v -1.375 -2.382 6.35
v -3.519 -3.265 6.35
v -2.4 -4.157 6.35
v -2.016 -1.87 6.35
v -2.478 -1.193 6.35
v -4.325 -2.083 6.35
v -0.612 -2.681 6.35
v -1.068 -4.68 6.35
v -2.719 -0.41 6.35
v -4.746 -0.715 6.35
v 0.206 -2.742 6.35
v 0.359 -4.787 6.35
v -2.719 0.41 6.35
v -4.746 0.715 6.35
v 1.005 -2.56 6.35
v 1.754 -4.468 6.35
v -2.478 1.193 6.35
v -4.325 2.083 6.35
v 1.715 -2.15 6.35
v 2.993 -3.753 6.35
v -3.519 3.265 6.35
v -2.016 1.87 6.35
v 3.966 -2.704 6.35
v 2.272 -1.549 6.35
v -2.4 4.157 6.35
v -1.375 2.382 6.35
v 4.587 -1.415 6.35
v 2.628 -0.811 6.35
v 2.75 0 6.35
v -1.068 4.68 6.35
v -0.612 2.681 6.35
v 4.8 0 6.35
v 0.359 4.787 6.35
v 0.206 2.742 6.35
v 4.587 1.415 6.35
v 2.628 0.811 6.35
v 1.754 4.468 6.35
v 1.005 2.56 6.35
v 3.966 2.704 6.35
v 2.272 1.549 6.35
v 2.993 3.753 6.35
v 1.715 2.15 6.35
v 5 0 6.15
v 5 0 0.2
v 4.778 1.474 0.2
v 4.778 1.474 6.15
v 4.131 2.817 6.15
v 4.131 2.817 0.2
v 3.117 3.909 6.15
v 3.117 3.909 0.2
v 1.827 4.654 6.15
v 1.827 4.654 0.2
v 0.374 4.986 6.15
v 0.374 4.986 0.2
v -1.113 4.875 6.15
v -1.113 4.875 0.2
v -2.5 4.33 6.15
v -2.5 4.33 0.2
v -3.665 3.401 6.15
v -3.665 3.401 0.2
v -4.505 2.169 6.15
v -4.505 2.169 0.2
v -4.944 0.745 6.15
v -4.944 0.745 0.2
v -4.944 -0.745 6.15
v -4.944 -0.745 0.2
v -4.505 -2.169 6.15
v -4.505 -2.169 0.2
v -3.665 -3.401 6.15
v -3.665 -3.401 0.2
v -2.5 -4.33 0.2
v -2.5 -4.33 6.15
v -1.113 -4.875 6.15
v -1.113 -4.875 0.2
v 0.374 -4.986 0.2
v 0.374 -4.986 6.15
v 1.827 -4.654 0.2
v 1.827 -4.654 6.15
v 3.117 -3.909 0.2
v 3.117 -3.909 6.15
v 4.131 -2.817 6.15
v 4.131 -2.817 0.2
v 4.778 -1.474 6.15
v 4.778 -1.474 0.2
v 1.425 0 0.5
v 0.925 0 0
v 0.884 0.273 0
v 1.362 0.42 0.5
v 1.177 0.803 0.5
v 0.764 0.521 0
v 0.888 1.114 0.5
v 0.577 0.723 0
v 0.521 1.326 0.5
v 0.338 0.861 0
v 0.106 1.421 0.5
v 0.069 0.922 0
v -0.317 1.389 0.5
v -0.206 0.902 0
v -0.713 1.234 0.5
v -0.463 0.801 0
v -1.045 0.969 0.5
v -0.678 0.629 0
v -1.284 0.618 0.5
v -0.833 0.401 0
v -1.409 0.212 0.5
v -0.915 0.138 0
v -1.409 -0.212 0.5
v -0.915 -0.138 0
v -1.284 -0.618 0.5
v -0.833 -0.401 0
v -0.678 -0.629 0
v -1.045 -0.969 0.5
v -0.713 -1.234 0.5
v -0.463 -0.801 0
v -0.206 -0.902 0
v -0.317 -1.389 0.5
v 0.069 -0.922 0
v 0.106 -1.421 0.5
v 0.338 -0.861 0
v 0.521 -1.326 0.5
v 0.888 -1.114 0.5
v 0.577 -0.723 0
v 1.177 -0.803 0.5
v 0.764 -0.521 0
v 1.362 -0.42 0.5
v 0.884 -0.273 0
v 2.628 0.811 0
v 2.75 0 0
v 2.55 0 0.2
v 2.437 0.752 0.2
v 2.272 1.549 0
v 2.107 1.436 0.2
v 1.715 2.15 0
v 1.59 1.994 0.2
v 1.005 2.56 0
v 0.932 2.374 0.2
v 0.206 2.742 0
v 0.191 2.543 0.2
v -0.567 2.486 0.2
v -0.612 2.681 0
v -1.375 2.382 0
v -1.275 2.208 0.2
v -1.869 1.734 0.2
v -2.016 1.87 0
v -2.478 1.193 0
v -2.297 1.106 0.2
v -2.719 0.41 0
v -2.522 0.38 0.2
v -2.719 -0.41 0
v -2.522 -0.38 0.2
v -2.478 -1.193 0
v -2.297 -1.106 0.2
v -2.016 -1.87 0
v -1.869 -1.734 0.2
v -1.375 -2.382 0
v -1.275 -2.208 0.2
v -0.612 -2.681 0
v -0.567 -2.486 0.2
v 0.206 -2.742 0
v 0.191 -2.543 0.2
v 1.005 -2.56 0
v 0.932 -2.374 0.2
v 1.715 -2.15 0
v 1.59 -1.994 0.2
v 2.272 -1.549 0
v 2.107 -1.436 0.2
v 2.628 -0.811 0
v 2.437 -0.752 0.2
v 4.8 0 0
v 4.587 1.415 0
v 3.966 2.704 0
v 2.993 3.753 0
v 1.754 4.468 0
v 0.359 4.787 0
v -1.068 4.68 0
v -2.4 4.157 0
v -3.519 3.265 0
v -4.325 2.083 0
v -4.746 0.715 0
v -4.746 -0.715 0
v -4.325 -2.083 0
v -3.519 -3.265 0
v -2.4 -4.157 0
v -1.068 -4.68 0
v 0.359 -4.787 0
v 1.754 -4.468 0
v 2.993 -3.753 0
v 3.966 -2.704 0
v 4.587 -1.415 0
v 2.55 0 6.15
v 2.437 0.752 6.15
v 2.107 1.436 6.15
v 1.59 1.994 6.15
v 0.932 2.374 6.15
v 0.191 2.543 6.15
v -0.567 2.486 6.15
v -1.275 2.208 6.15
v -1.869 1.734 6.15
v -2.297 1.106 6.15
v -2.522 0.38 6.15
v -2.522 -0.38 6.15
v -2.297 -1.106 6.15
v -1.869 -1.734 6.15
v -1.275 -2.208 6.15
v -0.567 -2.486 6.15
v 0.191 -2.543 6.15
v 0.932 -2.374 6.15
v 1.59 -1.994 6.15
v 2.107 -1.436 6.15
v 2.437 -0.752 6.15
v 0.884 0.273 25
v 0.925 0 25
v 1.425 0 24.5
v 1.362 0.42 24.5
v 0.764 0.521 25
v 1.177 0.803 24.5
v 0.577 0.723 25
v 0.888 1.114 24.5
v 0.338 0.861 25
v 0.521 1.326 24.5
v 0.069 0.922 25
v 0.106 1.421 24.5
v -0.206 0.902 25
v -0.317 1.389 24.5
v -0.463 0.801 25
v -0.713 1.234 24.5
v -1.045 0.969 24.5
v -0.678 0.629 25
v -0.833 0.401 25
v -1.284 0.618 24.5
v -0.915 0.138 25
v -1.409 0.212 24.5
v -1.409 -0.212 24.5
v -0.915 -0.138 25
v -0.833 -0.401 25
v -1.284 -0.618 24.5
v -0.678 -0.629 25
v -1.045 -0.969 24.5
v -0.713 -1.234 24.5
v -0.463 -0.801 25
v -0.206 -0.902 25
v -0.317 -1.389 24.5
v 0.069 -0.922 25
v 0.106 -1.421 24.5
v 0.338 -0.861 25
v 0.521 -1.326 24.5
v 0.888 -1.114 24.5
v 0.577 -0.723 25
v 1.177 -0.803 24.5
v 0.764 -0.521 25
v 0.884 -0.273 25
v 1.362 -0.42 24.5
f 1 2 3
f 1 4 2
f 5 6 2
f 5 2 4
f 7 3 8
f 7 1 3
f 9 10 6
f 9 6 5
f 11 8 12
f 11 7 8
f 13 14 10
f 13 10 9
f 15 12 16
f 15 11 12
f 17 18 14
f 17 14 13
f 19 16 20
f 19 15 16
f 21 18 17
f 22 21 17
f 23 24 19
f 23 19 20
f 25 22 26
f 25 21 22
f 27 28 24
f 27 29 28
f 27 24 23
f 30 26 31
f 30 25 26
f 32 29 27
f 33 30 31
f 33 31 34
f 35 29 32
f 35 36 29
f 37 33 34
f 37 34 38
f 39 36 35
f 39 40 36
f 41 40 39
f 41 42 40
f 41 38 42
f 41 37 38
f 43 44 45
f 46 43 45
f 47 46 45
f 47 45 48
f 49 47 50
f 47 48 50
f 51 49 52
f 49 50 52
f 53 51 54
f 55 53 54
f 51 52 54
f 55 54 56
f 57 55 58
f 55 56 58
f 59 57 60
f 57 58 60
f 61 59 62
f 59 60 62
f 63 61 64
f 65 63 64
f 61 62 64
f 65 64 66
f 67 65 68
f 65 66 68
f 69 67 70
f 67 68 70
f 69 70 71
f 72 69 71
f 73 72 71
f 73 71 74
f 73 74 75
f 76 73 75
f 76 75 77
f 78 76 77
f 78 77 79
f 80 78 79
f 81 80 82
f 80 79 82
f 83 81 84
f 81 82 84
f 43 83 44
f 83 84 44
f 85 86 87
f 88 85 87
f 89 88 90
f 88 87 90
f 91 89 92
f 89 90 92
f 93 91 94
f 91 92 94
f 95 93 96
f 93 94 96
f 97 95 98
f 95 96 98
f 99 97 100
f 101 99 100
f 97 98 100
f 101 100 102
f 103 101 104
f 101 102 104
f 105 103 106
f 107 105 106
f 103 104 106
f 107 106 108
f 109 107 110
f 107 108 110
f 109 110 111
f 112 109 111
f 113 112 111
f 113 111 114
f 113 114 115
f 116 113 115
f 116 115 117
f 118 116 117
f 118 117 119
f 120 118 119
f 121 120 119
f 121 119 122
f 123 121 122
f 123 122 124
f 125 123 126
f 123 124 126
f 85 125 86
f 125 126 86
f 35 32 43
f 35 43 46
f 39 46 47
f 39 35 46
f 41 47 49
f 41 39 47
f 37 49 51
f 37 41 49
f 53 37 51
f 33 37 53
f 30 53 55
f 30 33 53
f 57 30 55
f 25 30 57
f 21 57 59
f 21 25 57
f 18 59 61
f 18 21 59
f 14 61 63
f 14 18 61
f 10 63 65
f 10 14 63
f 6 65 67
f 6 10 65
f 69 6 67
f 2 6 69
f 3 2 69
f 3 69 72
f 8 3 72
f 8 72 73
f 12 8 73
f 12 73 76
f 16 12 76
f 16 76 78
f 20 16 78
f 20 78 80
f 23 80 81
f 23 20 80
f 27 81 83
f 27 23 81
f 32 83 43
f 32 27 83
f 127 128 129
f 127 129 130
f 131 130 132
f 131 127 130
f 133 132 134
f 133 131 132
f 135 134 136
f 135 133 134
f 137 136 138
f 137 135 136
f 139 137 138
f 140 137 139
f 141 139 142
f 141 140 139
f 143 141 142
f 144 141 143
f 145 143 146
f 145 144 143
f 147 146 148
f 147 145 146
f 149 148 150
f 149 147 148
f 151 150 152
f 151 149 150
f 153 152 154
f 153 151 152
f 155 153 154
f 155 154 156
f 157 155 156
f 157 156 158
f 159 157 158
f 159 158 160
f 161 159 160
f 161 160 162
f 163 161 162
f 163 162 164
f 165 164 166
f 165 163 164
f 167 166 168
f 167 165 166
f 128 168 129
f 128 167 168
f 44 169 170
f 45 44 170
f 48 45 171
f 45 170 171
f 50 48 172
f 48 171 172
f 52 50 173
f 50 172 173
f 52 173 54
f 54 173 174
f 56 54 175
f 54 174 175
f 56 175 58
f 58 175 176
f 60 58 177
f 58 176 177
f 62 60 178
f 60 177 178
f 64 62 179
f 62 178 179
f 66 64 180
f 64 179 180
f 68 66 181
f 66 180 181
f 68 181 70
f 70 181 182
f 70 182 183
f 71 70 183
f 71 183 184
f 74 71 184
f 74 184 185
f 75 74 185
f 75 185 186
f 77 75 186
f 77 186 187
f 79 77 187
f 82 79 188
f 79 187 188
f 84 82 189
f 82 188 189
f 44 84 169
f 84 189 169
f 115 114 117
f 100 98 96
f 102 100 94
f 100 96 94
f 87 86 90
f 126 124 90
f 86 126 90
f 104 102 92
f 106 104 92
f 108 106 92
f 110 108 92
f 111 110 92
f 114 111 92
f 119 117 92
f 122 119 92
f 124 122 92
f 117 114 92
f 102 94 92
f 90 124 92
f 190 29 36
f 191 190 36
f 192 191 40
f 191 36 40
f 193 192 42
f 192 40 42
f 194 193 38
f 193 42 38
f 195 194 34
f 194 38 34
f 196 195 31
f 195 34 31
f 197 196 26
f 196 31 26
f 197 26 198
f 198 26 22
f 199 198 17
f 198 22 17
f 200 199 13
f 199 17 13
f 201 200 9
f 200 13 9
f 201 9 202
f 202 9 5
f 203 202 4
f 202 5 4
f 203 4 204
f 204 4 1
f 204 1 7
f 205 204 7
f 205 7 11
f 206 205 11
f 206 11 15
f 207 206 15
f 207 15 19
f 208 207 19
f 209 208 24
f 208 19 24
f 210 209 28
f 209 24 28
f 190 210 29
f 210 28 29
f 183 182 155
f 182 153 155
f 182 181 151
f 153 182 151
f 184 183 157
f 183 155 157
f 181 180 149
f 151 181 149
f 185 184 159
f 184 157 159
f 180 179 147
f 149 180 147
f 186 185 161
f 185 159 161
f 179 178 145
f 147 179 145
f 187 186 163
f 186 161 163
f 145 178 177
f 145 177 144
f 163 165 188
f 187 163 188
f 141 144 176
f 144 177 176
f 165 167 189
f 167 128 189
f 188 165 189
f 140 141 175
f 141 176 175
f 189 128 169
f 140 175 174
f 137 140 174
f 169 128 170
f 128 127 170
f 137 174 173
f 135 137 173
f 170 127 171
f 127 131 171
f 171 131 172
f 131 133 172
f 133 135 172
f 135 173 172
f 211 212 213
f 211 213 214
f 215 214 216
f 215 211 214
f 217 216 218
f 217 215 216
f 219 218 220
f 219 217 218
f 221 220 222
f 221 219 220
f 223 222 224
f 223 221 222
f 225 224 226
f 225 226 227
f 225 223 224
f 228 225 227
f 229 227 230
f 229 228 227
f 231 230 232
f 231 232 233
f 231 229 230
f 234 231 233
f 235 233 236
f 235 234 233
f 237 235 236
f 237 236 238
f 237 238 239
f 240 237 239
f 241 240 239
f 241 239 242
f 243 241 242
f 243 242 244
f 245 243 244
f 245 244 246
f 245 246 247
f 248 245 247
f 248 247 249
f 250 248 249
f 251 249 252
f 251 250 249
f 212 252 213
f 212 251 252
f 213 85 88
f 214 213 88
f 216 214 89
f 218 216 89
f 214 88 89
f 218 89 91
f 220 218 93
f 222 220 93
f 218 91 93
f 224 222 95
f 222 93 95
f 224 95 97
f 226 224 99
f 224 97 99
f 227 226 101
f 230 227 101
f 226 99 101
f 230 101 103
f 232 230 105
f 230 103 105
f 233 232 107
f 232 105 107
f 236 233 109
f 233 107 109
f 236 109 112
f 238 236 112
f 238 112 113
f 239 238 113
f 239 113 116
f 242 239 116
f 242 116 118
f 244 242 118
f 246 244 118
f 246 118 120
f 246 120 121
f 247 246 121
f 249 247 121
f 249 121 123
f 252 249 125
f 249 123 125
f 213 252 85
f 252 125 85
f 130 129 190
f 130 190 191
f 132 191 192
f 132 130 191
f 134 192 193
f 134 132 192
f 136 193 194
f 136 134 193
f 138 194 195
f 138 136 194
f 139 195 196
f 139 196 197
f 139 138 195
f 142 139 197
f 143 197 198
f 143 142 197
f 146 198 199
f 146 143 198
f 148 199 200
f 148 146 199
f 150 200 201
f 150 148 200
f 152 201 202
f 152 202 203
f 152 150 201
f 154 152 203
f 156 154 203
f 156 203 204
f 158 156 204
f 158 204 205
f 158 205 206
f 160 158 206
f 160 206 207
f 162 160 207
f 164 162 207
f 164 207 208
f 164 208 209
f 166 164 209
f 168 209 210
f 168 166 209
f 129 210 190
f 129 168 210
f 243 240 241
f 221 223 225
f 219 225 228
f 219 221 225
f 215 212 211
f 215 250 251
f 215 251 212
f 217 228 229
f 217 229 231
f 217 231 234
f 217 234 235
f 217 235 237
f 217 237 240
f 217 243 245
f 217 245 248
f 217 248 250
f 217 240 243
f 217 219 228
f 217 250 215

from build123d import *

# Parameters (mm, degrees)
F0_R     = 1.425
F6_DEPTH = 25
F1_SIZE  = 0.5
F2_SIZE  = 0.5
F3_R     = 5
F3_R_2   = 2.55
F4_DEPTH = 6.35
F5_SIZE  = 0.2


with BuildPart() as f6:
    # F0 (on Top) → F6 (new body)
    with BuildSketch(Plane.XY):
        Circle(F0_R)
    extrude(amount=F6_DEPTH)

    # F1
    f1_edges = [f6.edges().sort_by_distance(p)[0] for p in [
        (-1.425, 0, 25),
    ]]
    chamfer(f1_edges, length=F1_SIZE)

    # F2
    f2_edges = [f6.edges().sort_by_distance(p)[0] for p in [
        (-1.425, 0, 0),
    ]]
    chamfer(f2_edges, length=F2_SIZE)


with BuildPart() as f4:
    # F3 (on Top) → F4 (new body)
    with BuildSketch(Plane.XY):
        Circle(F3_R)
        Circle(F3_R_2, mode=Mode.SUBTRACT)
    extrude(amount=F4_DEPTH)

    # F5
    f5_edges = [f4.edges().sort_by_distance(p)[0] for p in [
        (-2.55, 0, 6.35),
        (-5, 0, 6.35),
        (-5, 0, 0),
        (-2.55, 0, 0),
    ]]
    chamfer(f5_edges, length=F5_SIZE)


solid = Compound([f6.part, f4.part])
